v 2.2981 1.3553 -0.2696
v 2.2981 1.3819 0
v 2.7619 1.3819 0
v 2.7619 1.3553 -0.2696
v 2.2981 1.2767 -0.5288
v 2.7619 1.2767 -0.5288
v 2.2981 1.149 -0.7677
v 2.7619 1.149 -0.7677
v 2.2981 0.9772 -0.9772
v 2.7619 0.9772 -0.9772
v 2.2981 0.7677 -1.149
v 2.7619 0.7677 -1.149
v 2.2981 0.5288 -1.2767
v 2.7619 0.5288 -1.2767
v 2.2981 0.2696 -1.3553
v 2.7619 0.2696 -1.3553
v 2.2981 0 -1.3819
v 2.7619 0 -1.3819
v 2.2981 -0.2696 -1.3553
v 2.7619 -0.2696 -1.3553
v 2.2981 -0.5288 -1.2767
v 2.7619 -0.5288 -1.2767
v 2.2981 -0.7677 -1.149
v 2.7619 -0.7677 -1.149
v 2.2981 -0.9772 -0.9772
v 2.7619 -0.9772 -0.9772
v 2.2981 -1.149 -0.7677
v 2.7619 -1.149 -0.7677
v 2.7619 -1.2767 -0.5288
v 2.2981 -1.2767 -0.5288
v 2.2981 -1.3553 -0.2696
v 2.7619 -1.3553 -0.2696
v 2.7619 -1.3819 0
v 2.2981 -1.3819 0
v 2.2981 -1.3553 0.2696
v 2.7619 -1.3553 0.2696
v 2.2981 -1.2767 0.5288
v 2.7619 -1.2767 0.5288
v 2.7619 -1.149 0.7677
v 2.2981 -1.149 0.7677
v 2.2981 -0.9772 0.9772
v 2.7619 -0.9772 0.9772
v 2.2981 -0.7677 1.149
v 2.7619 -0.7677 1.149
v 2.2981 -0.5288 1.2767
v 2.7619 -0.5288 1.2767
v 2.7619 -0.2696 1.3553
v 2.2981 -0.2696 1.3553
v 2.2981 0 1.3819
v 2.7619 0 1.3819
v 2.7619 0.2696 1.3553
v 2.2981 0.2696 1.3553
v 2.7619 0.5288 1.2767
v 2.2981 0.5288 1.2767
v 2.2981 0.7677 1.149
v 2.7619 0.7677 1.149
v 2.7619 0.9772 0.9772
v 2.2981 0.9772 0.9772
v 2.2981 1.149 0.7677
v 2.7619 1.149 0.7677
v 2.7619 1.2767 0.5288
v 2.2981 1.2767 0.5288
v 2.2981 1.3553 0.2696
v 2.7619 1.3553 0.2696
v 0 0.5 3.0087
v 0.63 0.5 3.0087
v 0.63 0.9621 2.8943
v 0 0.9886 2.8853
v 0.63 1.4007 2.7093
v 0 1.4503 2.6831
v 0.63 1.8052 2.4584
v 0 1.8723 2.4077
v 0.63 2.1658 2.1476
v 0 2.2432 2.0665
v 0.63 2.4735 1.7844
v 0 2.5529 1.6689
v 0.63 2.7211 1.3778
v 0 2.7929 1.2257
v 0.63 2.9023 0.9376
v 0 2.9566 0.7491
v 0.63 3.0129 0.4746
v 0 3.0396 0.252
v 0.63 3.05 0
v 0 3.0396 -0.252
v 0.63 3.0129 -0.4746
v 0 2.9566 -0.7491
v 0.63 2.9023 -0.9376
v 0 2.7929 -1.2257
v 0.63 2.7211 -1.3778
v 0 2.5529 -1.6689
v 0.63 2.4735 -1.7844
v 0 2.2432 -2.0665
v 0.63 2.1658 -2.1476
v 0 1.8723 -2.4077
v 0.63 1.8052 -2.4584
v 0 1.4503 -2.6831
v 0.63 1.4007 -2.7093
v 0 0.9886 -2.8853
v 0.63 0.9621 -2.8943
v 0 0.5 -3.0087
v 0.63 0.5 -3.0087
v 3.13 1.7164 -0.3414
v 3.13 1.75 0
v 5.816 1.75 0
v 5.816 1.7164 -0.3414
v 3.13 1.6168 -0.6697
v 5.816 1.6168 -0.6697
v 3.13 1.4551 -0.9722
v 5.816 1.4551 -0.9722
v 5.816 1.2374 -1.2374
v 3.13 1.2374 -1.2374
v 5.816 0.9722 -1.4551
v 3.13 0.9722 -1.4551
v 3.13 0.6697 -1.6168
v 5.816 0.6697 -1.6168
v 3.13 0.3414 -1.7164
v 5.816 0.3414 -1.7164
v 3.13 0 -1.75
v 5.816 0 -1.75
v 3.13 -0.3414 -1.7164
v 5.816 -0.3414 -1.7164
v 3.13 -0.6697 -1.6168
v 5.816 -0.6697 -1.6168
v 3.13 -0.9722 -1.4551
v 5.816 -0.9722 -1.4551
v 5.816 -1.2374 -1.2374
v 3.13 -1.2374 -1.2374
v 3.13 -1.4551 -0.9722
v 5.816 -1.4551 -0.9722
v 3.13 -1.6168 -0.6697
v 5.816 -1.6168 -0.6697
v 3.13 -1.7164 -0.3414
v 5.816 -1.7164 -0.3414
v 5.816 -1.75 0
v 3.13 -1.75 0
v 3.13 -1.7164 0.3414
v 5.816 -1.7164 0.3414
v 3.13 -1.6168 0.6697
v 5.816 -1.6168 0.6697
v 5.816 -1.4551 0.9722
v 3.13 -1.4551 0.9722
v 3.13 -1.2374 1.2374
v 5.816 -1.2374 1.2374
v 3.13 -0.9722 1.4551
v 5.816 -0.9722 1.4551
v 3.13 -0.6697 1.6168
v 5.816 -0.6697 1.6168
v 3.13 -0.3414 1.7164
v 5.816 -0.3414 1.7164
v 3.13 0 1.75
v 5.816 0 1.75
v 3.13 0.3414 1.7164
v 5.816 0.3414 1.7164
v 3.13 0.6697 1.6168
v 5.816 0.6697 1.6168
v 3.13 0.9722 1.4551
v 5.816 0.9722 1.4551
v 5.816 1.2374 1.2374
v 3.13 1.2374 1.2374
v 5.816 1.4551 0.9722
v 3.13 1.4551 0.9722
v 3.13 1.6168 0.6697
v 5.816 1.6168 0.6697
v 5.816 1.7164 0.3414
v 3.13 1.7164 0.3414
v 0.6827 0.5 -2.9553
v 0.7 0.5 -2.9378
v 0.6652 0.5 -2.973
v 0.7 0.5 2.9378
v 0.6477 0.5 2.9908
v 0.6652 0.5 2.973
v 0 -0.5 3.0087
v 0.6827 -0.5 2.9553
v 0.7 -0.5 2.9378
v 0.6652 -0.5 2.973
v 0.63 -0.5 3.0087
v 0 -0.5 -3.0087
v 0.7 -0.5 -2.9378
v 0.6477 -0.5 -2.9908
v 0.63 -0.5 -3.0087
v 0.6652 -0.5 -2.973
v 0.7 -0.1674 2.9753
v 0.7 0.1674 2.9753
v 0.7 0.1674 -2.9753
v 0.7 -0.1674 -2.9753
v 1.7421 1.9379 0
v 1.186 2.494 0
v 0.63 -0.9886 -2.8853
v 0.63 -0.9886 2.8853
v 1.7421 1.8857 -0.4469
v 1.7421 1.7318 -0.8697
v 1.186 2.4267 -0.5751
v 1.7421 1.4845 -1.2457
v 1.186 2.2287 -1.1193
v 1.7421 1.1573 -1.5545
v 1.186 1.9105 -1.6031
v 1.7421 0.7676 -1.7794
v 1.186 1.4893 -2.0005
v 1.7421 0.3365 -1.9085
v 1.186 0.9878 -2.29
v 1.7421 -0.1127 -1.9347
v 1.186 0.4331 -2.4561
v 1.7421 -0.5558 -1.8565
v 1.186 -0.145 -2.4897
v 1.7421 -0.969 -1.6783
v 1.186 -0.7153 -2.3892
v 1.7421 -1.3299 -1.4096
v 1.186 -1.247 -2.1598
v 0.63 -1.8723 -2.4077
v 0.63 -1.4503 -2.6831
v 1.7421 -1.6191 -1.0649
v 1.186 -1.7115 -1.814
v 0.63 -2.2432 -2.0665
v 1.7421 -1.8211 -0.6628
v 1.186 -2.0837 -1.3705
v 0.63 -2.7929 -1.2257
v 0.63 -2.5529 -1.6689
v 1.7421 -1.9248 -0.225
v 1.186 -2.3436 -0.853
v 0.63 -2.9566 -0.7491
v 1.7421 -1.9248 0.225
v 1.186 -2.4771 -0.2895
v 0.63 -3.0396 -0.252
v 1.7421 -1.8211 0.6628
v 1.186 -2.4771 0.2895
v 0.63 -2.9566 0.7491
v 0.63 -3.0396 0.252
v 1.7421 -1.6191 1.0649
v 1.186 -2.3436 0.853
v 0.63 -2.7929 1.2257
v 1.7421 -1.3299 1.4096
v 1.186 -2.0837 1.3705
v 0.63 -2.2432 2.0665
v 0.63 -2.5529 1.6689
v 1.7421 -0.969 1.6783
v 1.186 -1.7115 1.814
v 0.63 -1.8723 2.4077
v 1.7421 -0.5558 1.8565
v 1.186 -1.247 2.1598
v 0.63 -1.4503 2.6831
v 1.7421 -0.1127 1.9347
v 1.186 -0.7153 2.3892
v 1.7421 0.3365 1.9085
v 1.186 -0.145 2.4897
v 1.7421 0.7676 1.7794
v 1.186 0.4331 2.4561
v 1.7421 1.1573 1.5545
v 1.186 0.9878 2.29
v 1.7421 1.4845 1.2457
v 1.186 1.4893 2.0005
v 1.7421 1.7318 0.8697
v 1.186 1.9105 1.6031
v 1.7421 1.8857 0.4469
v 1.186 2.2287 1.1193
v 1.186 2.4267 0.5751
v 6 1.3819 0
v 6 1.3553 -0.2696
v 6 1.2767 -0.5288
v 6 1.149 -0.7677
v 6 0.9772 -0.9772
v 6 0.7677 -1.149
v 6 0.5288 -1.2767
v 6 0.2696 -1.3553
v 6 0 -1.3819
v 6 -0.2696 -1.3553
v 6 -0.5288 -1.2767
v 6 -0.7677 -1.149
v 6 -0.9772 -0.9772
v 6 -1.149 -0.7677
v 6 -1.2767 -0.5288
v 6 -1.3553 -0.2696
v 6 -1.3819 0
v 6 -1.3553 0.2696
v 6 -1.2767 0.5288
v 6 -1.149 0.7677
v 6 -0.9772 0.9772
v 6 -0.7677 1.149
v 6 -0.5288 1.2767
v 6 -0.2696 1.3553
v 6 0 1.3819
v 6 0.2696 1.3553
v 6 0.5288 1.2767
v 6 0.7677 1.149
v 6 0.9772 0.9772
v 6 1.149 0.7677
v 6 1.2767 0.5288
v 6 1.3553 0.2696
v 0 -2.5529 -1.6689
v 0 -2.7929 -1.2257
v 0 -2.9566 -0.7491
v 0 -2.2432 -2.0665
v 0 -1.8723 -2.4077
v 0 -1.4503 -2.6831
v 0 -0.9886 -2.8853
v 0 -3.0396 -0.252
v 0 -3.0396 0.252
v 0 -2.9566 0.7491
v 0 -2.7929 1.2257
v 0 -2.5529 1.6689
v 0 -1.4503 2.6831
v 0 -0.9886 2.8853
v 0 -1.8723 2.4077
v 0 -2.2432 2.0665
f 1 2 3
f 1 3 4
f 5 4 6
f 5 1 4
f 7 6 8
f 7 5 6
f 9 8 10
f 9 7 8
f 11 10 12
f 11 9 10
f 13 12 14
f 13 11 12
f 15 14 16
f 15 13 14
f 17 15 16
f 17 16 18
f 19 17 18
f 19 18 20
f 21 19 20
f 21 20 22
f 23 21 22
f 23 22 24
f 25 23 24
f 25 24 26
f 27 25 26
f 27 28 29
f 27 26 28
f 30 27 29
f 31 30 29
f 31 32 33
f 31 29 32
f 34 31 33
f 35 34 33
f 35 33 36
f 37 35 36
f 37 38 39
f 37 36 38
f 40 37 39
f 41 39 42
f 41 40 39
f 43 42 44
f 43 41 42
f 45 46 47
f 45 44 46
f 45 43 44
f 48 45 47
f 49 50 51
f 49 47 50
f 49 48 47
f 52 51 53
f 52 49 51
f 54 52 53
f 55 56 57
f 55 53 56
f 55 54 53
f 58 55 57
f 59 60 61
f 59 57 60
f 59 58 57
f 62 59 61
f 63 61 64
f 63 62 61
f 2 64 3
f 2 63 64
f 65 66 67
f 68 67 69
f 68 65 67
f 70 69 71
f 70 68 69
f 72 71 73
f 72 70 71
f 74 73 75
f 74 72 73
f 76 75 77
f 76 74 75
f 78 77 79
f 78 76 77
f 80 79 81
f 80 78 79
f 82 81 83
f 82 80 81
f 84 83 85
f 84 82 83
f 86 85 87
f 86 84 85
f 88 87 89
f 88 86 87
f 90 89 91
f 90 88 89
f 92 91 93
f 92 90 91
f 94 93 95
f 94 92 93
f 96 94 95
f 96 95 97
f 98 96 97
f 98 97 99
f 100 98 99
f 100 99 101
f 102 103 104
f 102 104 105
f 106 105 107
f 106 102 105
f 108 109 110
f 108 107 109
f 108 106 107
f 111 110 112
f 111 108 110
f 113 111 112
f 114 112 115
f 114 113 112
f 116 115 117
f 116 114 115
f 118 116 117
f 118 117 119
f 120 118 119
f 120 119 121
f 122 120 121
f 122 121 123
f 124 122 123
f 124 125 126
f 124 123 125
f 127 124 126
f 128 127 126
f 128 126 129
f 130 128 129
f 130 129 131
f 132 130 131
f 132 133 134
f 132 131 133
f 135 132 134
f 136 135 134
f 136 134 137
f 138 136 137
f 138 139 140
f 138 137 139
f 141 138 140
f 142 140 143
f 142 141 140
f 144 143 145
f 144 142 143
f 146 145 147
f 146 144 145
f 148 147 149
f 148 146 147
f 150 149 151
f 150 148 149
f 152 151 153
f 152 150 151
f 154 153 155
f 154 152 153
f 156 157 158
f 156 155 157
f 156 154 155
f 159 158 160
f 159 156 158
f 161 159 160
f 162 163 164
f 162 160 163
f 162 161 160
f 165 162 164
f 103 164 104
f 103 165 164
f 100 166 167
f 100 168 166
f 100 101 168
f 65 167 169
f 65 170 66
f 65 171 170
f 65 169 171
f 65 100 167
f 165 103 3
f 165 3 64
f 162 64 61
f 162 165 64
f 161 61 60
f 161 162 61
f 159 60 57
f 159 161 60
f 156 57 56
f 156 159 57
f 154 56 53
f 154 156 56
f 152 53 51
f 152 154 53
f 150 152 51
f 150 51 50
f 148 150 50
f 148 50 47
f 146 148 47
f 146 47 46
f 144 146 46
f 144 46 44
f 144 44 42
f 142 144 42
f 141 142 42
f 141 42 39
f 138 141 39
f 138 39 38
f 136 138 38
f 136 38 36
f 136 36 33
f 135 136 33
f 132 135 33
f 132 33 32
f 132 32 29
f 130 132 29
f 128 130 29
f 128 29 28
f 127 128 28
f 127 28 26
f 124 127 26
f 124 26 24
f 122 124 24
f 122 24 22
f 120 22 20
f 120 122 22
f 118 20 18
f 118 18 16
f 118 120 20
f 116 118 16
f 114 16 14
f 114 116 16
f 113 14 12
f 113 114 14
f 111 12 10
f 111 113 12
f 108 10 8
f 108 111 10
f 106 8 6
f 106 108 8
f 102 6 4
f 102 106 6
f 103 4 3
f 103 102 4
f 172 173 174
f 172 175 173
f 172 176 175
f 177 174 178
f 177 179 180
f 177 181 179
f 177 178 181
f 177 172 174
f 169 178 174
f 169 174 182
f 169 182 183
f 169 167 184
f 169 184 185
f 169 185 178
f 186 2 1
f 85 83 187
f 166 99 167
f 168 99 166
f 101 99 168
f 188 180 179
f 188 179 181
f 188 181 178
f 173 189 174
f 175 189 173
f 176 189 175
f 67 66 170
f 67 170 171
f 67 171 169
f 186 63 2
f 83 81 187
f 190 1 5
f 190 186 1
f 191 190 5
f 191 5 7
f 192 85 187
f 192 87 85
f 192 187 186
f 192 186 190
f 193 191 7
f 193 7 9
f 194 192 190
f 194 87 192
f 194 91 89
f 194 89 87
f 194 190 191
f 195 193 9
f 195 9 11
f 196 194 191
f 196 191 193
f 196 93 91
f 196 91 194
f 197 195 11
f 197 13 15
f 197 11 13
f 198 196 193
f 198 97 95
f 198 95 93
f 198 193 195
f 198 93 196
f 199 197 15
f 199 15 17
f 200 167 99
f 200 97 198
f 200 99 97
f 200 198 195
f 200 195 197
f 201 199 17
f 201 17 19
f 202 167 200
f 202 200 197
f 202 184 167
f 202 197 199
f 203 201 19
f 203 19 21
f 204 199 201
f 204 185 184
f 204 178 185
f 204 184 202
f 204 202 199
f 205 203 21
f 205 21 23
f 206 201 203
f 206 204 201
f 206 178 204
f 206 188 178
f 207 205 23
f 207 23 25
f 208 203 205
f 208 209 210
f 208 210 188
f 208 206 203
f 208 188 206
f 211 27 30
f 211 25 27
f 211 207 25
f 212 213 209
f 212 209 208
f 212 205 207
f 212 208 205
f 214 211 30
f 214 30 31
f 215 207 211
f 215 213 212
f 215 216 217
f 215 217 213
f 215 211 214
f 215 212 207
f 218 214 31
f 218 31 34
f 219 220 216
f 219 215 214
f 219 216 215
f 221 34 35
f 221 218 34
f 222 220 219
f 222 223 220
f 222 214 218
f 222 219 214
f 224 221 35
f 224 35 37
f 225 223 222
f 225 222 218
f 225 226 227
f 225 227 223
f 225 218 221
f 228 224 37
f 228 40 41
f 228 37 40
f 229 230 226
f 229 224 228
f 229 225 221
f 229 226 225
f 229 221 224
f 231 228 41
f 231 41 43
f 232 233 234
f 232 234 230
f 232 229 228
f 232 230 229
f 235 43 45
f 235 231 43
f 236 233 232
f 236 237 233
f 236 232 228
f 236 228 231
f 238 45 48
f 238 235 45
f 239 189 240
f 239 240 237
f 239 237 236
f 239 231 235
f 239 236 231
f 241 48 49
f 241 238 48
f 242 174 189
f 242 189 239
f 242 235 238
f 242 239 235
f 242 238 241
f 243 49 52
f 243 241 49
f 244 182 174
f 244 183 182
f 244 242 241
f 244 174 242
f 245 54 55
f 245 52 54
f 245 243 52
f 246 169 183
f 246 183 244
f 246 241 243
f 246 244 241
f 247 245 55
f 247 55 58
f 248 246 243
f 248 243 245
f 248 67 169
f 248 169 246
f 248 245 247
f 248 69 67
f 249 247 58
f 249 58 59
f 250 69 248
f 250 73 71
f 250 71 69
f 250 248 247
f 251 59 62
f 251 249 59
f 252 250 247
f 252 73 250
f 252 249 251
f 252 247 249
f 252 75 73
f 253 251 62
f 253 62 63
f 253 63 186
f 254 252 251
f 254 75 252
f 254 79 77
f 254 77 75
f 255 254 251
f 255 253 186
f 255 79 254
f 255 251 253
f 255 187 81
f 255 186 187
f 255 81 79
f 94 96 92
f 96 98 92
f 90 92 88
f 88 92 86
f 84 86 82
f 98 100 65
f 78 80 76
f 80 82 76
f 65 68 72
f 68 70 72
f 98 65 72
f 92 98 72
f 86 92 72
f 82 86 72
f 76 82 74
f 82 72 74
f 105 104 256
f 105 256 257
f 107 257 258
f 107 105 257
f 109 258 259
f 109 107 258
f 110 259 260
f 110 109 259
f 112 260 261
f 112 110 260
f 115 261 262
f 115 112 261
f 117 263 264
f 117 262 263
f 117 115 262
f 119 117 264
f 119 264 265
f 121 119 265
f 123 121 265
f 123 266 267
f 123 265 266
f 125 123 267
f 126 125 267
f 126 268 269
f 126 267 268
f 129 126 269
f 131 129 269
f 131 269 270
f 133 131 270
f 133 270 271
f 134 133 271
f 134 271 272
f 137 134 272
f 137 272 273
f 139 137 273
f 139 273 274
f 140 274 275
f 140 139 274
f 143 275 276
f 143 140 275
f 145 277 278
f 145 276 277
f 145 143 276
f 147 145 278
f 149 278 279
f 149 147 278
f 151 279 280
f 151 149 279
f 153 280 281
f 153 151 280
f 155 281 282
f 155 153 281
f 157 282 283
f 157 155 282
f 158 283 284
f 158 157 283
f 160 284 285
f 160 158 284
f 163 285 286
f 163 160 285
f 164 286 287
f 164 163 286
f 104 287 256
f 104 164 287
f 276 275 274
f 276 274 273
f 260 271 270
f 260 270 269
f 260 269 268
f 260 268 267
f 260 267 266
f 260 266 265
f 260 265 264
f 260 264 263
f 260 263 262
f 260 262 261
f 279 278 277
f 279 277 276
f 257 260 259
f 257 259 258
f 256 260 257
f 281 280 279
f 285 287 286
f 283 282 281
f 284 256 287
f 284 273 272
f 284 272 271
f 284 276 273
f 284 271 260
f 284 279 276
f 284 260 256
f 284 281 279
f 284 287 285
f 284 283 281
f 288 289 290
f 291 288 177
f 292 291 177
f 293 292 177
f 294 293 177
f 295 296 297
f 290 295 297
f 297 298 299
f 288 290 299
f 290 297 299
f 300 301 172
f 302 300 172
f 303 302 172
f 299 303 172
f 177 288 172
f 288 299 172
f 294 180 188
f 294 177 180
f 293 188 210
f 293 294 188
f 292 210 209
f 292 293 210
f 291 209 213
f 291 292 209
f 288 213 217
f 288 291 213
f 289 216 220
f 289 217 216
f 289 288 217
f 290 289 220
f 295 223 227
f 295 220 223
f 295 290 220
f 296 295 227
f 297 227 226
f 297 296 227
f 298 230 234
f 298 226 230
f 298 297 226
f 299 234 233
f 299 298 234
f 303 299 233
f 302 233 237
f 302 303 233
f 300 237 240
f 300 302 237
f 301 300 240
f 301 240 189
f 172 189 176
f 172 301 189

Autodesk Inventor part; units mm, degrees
ref_plane "YZ Plane" through (0, 0, 0) normal (1, 0, 0) x (0, 1, 0)
ref_plane "XZ Plane" through (0, 0, 0) normal (0, 1, 0) x (-1, 0, 0)
sketch "Sketch1" plane through (0, 0, 0) normal (0, 0, 1) x (1, 0, 0)
  line L0 (0, 0) -> (6, 0)
  line L1 (6, 0) -> (6, 1.75)
  line L2 (6, 1.75) -> (3.13, 1.75)
  line L3 (3.13, 1.75) -> (2.7619, 1.3819)
  line L4 (2.7619, 1.3819) -> (2.2981, 1.3819)
  line L5 (2.2981, 1.3819) -> (0.63, 3.05)
  line L6 (0.63, 3.05) -> (0, 3.05)
  line L7 (0, 3.05) -> (0, 0)
  line L8 (3.13, 1.75) -> (1.93, 1.75) construction
  line L9 (-1.2, 0) -> (7.2, 0) projected
  line L10 (0, 3.66) -> (0, -0.61) projected
  dimension "d0" = 6
  dimension "d1" = 45
  dimension "d2" = 0.3681
  dimension "d3" = 2.87
  dimension "d4" = 1.93
  dimension "d5" = 2.7639
  dimension "d6" = 3.5
  dimension "d7" = 6.1
revolve "Body" add sketch "Sketch1" angle 360 about axis through (0, 0, 0) along (1, 0, 0)
sketch "Sketch2" plane through (0, 0, 0) normal (-1, 0, 0) x (0, 0, 1)
  line L0 (3.05, -0.5) -> (-3.05, -0.5)
  line L1 (-3.05, -0.5) -> (-3.05, 0.5)
  line L2 (-3.05, 0.5) -> (3.05, 0.5)
  line L3 (3.05, 0.5) -> (3.05, -0.5)
  line L4 (0, 0.5) -> (0, -0.5) construction
  line L5 (-3.05, 0) -> (3.05, 0) construction
  line L6 (0, 3.05) -> (0, 0) projected
  dimension "d15" = 1
  dimension "d16" = 6.1
extrude "Slot" cut sketch "Sketch2" against normal blind 0.7
thread "Thread" size "M3.5x0.6" class "6g" standard "ISO Metric profile" length 2.87
chamfer "Chamfer1" distance 0.3681 distance2 0.184 1 edges at (6, -1.75, 0) measured on face at (6, 1.0235, -0.4633)
ref_plane "Work Plane1" through (33.575, 0, 0) normal (0, 0, -1) x (1, 0, 0)
equation "\"d0\" = NLG"
equation "\"d1\" = 0.5 * SEWI"
equation "\"d2\" = GAL"
equation "\"d3\" = GEL"
equation "\"d4\" = KOH"
equation "\"d5\" = BDM"
equation "\"d6\" = GD"
equation "\"d7\" = KOD"
equation "\"d15\" = SBR"
equation "\"d16\" = KOD"
equation "\"d8\" = STI"
equation "\"d10\" = GEL"
equation "\"d12\" = -0.5 * SPD + 0.5 * GD"
equation "\"d13\" = 0.5 * GAL"
equation "\"NLG\" = 6"
equation "\"GAL\" = 0.61345 * PTC"
equation "\"GEL\" = 2.87"
equation "\"KOH\" = 1.93"
equation "\"KOD\" = 6.1"
equation "\"SEWI\" = 90deg"
equation "\"BDM\" = NND - 1.2269 * PTC"
equation "\"GD\" = NND"
equation "\"SBR\" = 1"
equation "\"STI\" = 0.7"
equation "\"SPD\" = NND - 1.2269 * PTC"
equation "\"GUL\" = 0.61345 * PTC"
equation "\"PTC\" = 0.6"
equation "\"EPV\" = 3.68"
equation "\"THREADDIA\" = 3.5"
equation "\"TOA\" = 30deg"
equation "\"RR\" = 0.35"
equation "\"NND\" = 3.5"
equation "\"GD1\" = THREADDIA - 1.2269 * PTC"
properties part number "AS 1427 - M3.5 x 6" material "Steel, Mild"
